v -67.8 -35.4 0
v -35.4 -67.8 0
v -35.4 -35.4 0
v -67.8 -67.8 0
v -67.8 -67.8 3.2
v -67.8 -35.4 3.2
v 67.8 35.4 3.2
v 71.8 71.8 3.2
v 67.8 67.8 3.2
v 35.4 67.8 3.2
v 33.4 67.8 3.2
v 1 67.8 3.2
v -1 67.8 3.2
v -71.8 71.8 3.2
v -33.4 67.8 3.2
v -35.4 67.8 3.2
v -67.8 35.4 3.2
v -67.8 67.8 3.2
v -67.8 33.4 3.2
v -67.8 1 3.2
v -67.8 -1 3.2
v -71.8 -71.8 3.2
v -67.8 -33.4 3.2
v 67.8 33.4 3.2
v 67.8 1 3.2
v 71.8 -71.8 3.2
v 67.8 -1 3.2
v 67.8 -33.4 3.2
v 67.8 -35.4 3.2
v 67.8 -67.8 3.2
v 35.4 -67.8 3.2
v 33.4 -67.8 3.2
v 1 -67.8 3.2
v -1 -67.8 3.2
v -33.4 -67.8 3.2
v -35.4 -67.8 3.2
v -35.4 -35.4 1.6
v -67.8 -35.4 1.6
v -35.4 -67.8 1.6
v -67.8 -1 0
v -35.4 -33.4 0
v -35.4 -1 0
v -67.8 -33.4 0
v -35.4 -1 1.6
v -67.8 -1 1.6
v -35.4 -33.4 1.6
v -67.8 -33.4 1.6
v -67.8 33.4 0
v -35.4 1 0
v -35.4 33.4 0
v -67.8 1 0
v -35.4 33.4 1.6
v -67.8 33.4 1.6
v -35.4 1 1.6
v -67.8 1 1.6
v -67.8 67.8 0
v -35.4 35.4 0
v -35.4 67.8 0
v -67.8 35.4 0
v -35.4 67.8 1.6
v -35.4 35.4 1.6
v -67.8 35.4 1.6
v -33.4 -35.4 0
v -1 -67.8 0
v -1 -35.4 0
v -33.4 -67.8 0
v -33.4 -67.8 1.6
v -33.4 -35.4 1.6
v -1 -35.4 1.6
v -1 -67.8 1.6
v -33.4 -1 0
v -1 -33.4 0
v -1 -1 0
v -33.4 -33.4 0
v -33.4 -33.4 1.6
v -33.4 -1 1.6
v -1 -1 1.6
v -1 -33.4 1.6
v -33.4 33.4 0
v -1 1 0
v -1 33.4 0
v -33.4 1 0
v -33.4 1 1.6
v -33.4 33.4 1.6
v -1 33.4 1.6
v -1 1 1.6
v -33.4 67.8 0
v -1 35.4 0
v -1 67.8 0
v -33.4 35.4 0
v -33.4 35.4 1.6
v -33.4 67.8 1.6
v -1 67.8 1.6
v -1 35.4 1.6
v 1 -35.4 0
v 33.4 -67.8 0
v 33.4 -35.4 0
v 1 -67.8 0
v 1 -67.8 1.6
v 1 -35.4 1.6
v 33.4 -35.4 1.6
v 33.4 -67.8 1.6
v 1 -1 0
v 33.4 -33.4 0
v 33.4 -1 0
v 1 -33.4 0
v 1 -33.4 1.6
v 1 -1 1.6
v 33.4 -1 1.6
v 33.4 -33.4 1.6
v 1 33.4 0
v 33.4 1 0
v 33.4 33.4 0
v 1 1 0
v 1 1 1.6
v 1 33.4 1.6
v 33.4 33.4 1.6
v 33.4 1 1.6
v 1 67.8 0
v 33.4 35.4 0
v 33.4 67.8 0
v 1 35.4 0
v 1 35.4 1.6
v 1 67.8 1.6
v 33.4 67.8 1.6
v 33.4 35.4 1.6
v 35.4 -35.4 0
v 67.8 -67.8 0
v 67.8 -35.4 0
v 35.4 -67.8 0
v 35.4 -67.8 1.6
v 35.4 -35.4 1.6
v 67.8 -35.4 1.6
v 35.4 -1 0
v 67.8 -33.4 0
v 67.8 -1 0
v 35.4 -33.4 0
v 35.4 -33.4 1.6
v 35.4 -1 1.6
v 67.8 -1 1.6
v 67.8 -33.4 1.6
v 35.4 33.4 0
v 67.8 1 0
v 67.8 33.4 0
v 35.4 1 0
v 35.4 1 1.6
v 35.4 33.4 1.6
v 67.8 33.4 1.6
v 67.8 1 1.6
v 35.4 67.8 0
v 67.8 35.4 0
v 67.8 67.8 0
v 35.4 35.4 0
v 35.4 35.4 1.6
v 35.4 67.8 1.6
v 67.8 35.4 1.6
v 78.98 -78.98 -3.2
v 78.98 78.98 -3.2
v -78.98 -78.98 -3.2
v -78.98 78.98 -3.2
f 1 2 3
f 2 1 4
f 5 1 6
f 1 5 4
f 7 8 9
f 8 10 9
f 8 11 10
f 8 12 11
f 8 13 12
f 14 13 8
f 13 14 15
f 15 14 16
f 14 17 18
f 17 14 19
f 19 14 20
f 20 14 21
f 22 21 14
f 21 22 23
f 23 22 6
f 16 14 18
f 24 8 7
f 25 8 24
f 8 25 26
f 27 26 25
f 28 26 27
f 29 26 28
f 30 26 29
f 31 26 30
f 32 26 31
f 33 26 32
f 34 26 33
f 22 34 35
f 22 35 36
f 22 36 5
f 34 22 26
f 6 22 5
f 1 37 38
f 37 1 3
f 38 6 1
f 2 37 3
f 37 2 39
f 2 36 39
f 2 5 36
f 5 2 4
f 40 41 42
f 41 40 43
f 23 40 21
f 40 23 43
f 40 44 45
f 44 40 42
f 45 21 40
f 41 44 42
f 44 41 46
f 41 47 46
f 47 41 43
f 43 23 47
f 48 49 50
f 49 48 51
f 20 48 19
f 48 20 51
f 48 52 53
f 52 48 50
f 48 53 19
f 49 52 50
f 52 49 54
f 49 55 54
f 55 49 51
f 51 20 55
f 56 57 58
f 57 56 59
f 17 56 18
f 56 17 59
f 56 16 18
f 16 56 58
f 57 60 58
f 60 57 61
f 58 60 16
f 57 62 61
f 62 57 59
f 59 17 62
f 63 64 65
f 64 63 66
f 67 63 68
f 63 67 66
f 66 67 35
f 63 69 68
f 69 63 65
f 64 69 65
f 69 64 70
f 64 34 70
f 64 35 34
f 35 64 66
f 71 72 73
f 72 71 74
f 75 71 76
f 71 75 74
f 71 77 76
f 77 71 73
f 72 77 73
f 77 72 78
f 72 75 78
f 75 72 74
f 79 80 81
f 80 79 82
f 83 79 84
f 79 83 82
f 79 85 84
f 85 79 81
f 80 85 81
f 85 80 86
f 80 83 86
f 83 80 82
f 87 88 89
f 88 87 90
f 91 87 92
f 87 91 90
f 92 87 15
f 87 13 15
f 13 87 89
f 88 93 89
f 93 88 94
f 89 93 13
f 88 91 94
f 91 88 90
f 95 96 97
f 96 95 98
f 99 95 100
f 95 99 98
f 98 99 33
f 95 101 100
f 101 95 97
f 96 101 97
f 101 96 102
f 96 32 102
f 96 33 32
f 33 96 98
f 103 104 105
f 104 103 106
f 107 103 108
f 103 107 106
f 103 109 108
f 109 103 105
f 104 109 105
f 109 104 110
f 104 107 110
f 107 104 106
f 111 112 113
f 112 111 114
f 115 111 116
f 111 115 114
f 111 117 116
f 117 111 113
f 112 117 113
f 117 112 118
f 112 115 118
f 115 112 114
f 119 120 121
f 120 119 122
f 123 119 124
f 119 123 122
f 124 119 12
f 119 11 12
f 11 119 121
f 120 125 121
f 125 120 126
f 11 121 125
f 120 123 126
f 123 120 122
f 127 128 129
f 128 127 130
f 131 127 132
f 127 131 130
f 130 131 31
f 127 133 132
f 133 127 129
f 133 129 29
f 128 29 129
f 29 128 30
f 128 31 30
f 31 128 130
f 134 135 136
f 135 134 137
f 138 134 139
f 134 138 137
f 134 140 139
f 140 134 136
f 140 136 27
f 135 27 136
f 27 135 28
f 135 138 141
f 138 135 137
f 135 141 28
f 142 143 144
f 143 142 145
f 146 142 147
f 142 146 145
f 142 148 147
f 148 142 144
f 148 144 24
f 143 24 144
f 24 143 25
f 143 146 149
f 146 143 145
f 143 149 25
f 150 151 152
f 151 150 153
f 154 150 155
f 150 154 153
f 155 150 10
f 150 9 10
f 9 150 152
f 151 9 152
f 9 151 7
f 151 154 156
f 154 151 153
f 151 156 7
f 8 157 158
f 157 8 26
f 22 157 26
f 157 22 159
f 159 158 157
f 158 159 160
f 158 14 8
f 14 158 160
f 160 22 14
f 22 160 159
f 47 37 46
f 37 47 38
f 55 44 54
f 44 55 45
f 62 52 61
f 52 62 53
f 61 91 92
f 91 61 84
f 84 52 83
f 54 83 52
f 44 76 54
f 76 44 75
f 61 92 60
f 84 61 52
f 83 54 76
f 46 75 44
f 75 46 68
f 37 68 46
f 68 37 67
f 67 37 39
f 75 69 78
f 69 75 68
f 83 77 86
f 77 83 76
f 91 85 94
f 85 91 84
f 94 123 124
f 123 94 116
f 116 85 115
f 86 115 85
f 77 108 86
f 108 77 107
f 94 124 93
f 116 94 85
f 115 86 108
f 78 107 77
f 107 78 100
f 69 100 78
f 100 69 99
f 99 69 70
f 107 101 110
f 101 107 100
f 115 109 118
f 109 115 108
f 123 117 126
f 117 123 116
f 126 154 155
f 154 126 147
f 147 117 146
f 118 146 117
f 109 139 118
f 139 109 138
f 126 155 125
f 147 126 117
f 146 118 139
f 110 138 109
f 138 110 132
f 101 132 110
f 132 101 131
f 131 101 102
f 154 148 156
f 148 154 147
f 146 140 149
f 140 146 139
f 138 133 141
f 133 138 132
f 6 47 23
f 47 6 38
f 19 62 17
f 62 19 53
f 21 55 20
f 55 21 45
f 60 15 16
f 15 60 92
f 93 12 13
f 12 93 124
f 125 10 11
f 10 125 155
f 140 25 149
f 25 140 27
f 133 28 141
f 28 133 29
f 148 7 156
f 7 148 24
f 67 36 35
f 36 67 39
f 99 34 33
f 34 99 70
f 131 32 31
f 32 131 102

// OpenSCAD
// Extra width of the plate slots to allow the plates to fit loosely. Tweak as needed
CLEARANCE=0.4;
// How many tiles in the x-direction
TILES_X=4;
// How many tiles in the y-direction
TILES_Y=4;

/* [Hidden] */

// dimensions of a 4x4 plate
WIDTH_PLATE = 32;
// This is the thickness of the plate itself
// not including the raised studs
THICKNESS_PLATE = 3.2;

// make the cutouts a liiitle wider
WIDTH_PLATE_CUTOUT = WIDTH_PLATE + CLEARANCE;

// Add a little spacing between cutouts. This way each
// tile stays in place even as neighbors are swapped
// in/out
SPACING = 2;
CUTOUT_STRIDE = SPACING + WIDTH_PLATE_CUTOUT;

OVERALL_WIDTH_X = 
  TILES_X * WIDTH_PLATE_CUTOUT + (TILES_X - 1) * SPACING;
OVERALL_WIDTH_Y = 
  TILES_Y * WIDTH_PLATE_CUTOUT + (TILES_Y - 1) * SPACING;

MARGIN = 4;
FRUSTUM_TOP_WIDTH_X = OVERALL_WIDTH_X + 2 * MARGIN;
FRUSTUM_TOP_WIDTH_Y = OVERALL_WIDTH_Y + 2 * MARGIN;

module cutouts() {
  translate([-0.5 * OVERALL_WIDTH_X, -0.5 * OVERALL_WIDTH_Y])
  for (i=[0:TILES_X - 1], j=[0:TILES_Y - 1]) {
    translate(CUTOUT_STRIDE * [i, j])
    linear_extrude(THICKNESS_PLATE)
    square(WIDTH_PLATE_CUTOUT);
  }  
}

module shallow_cut() {
  translate([
    -0.5 * OVERALL_WIDTH_X,
    -0.5 * OVERALL_WIDTH_Y, 
    0.5 * THICKNESS_PLATE
  ])
  linear_extrude(0.5 * THICKNESS_PLATE + 0.1) //The arbitrary added depth of 0.1 avoids coplanar faces which glitch in the preview render. -LM
  square([OVERALL_WIDTH_X, OVERALL_WIDTH_Y]);
}

module base() {
  translate([0, 0, THICKNESS_PLATE])
  mirror([0, 0, 1])
  linear_extrude(2 * THICKNESS_PLATE, scale=1.1)
  square([FRUSTUM_TOP_WIDTH_X, FRUSTUM_TOP_WIDTH_Y], center=true);
}

difference() {
  base();
  shallow_cut();
  cutouts();
}
